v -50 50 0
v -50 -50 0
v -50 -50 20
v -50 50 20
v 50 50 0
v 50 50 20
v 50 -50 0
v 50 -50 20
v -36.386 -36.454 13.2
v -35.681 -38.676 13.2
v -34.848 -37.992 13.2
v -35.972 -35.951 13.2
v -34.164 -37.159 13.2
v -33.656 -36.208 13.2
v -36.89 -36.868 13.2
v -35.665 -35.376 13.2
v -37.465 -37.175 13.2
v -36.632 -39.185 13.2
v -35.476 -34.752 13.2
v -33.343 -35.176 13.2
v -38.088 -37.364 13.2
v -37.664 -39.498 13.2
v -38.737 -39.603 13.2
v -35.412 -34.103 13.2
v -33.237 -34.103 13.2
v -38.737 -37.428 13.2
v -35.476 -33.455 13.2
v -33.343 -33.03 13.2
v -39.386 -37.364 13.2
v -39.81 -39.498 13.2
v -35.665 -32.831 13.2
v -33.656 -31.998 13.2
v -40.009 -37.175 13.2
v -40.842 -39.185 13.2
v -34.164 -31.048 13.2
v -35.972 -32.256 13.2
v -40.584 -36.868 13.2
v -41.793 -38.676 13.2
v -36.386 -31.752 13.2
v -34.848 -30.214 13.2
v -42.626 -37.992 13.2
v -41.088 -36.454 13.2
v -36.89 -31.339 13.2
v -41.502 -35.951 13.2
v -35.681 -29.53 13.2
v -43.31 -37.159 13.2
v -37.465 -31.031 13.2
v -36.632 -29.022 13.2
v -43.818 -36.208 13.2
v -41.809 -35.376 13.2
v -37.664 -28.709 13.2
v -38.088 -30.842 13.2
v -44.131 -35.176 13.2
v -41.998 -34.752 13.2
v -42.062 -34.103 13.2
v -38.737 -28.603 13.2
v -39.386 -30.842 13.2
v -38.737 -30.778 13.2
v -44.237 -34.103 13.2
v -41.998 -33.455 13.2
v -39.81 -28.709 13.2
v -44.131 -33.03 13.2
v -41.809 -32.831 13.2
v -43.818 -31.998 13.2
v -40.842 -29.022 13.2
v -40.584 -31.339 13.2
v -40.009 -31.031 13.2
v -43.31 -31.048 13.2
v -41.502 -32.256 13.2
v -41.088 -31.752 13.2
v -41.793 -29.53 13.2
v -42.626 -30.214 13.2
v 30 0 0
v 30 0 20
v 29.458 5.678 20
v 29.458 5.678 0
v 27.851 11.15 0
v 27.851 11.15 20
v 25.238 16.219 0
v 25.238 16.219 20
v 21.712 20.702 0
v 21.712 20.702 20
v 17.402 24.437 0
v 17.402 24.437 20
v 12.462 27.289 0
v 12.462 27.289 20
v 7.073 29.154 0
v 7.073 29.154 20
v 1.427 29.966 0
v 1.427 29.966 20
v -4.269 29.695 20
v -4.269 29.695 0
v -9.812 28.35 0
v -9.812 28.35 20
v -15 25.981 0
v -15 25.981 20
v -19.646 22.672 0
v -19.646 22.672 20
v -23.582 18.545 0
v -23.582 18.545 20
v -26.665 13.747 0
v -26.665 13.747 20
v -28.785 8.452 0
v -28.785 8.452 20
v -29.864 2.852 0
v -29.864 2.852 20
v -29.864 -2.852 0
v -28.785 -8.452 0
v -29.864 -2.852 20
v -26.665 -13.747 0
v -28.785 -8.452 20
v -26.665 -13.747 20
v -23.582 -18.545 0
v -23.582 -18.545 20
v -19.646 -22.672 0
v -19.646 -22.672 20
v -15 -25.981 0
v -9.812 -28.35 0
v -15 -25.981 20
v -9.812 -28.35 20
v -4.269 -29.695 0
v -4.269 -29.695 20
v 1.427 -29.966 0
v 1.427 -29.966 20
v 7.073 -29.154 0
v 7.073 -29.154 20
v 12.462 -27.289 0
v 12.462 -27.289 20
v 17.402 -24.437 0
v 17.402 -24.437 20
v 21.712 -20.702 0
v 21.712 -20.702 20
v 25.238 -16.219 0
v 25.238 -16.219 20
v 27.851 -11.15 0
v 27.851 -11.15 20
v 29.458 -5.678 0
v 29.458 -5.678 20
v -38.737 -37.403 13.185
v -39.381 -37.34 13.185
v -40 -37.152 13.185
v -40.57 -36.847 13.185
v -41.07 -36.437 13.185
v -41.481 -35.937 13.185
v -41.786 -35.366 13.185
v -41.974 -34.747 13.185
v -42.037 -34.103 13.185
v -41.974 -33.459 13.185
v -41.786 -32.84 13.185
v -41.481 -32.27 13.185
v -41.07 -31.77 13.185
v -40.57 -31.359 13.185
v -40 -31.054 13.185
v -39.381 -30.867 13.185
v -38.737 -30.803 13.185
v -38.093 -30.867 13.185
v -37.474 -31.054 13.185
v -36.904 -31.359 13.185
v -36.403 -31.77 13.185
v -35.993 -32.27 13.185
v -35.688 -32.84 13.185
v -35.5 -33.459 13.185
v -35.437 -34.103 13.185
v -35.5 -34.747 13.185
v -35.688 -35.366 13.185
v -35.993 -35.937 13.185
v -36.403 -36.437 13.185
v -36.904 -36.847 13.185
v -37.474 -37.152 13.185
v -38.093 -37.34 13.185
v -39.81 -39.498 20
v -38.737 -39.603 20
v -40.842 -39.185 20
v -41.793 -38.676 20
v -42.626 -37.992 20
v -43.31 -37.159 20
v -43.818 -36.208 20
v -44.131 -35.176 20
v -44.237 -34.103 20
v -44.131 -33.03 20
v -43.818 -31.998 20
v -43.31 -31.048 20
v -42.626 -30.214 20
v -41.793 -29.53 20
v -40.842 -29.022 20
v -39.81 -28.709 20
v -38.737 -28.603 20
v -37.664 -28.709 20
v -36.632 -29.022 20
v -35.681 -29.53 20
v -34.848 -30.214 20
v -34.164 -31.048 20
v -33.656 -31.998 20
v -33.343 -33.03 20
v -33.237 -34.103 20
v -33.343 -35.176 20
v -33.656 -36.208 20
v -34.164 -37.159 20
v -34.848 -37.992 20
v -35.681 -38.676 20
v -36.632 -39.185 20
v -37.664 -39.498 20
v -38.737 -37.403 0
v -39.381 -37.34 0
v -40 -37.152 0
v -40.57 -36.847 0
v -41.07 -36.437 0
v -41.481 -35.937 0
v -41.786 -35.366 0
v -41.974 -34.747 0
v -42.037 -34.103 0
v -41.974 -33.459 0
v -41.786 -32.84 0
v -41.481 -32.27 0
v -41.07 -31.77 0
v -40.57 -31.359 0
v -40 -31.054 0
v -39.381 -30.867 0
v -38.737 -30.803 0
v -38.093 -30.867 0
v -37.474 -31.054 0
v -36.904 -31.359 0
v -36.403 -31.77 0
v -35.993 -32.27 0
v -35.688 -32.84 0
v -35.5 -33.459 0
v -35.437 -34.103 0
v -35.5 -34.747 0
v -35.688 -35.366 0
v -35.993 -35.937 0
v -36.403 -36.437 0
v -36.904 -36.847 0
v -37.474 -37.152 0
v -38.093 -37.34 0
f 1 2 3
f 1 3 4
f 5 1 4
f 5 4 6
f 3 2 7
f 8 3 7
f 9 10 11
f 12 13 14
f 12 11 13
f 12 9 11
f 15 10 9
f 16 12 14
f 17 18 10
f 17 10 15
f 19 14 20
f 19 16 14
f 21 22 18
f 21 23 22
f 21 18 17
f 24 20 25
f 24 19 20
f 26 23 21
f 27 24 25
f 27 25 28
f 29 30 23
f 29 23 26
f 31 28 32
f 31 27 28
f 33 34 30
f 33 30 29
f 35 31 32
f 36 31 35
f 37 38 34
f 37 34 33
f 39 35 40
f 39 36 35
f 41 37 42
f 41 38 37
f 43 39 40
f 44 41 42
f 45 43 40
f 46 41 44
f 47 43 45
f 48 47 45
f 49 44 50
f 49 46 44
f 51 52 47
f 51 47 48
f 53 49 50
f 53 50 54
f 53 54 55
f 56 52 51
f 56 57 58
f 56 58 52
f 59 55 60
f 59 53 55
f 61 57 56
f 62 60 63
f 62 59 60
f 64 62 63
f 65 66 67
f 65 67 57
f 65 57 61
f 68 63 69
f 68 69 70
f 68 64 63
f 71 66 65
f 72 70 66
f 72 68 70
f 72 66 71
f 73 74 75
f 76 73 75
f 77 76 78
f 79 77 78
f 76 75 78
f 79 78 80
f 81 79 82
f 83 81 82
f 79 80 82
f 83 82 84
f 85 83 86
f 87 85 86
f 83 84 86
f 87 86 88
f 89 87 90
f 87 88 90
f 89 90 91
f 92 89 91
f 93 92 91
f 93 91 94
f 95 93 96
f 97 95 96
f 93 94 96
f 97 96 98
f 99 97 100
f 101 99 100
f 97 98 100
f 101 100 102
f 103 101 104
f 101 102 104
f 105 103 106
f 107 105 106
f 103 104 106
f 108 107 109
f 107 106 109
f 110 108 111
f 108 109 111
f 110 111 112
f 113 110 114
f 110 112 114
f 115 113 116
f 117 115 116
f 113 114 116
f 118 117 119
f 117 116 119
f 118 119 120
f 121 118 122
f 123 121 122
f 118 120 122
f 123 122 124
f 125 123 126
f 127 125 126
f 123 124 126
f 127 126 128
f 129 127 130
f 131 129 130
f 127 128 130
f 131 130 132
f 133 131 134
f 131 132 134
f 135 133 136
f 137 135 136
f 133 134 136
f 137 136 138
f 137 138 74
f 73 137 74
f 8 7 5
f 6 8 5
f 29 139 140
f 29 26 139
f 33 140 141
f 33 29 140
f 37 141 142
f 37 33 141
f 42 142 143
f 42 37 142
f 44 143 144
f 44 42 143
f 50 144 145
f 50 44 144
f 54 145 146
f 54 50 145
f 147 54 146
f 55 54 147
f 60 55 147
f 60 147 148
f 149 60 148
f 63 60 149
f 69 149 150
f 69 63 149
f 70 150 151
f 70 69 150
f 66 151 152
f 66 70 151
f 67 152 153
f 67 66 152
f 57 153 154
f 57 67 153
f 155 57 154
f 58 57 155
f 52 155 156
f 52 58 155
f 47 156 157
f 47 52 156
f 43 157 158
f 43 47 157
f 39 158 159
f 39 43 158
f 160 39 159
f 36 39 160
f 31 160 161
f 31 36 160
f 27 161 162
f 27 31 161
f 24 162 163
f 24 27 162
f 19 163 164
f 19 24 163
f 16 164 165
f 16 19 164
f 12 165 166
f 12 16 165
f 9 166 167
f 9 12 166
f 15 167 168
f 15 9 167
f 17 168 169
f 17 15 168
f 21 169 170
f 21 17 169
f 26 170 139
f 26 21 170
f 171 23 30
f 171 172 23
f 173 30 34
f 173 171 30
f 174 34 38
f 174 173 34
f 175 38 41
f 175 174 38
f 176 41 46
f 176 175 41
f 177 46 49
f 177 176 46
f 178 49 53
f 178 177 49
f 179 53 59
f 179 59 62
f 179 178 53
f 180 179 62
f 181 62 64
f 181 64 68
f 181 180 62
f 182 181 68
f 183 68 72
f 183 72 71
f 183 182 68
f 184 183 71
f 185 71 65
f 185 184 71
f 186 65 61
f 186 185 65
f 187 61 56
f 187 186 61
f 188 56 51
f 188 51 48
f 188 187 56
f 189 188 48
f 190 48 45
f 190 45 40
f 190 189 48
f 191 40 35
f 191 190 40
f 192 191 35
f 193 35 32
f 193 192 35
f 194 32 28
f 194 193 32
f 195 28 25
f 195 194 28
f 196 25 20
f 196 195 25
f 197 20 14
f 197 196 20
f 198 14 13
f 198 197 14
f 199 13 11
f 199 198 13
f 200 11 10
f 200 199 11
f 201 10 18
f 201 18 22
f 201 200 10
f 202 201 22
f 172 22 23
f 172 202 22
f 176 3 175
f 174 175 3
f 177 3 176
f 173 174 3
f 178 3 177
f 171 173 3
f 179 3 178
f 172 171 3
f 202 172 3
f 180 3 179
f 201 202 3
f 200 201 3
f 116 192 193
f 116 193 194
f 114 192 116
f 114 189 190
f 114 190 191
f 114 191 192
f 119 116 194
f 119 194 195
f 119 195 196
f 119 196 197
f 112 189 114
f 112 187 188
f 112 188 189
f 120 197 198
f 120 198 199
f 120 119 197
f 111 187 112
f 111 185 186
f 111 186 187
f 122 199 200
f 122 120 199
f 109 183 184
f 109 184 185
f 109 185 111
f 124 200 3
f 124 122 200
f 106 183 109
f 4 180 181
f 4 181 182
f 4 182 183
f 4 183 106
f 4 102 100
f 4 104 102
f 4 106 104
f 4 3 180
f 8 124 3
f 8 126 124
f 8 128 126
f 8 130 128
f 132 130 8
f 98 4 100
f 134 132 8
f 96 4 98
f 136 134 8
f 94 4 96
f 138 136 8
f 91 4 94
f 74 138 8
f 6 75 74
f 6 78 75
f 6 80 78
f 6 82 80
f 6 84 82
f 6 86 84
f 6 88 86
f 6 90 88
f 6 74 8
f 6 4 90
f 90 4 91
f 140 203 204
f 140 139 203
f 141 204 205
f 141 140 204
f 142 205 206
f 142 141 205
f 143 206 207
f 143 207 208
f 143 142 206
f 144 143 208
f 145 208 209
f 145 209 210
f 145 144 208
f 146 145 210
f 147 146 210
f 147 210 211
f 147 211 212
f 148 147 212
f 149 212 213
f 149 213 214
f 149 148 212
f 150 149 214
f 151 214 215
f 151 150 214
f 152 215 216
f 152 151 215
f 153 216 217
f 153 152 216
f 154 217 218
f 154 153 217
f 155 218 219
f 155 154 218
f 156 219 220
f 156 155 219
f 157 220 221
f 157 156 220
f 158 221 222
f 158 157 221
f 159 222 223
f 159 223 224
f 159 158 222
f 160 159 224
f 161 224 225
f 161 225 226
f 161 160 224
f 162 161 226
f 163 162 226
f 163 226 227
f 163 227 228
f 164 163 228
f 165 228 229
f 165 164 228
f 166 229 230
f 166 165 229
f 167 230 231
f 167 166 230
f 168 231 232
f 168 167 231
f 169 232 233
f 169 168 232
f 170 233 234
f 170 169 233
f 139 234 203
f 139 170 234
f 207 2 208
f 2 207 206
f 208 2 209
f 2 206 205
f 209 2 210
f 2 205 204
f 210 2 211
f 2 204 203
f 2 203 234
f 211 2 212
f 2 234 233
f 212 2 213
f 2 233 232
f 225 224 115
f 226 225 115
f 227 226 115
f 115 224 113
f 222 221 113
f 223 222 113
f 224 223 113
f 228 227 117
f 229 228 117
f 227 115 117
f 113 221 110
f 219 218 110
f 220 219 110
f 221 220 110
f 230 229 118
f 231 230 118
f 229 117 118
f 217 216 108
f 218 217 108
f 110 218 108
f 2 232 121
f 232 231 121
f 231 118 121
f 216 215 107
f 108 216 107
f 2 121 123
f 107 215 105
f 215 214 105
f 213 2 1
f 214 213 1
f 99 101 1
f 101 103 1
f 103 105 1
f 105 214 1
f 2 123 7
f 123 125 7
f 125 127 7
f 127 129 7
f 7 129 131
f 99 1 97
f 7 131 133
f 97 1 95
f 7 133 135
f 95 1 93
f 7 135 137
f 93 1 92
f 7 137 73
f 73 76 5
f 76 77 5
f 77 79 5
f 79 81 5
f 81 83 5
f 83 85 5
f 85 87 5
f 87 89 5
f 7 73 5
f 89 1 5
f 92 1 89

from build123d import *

# Parameters (mm, degrees)
SKETCH_1_W          = 100
SKETCH_1_H          = 100
EXTRUDE_1_DEPTH     = 20
SKETCH_2_R          = 30
CUT_EXTRUDE_1_DEPTH = 20


with BuildPart() as part:
    # 草图1 → 凸台-拉伸1 (new body)
    with BuildSketch(Plane.XY):
        Rectangle(SKETCH_1_W, SKETCH_1_H)
    extrude(amount=EXTRUDE_1_DEPTH)

    # 草图2 → 切除-拉伸1 (cut)
    with BuildSketch(Plane.XY.offset(20)):
        Circle(SKETCH_2_R)
    extrude(amount=-CUT_EXTRUDE_1_DEPTH, mode=Mode.SUBTRACT)

    # 草图3 → M6 六角圆柱头螺钉的柱形沉头孔1 (revolve, cut)
    with BuildSketch(Plane(origin=(-38.736943886, -34.103248867, 20), x_dir=(0, -1, 0), z_dir=(1, 0, 0))):
        Polygon((0, 0), (0, 20), (3.3, 20), (3.3, 6.815021515), (3.325, 6.8), (5.5, 6.8), (5.5, 0), align=None)
    revolve(axis=Axis((-38.736943886, -34.103248867, 26.35), (0, 0, -1)), mode=Mode.SUBTRACT)


solid = part.part
